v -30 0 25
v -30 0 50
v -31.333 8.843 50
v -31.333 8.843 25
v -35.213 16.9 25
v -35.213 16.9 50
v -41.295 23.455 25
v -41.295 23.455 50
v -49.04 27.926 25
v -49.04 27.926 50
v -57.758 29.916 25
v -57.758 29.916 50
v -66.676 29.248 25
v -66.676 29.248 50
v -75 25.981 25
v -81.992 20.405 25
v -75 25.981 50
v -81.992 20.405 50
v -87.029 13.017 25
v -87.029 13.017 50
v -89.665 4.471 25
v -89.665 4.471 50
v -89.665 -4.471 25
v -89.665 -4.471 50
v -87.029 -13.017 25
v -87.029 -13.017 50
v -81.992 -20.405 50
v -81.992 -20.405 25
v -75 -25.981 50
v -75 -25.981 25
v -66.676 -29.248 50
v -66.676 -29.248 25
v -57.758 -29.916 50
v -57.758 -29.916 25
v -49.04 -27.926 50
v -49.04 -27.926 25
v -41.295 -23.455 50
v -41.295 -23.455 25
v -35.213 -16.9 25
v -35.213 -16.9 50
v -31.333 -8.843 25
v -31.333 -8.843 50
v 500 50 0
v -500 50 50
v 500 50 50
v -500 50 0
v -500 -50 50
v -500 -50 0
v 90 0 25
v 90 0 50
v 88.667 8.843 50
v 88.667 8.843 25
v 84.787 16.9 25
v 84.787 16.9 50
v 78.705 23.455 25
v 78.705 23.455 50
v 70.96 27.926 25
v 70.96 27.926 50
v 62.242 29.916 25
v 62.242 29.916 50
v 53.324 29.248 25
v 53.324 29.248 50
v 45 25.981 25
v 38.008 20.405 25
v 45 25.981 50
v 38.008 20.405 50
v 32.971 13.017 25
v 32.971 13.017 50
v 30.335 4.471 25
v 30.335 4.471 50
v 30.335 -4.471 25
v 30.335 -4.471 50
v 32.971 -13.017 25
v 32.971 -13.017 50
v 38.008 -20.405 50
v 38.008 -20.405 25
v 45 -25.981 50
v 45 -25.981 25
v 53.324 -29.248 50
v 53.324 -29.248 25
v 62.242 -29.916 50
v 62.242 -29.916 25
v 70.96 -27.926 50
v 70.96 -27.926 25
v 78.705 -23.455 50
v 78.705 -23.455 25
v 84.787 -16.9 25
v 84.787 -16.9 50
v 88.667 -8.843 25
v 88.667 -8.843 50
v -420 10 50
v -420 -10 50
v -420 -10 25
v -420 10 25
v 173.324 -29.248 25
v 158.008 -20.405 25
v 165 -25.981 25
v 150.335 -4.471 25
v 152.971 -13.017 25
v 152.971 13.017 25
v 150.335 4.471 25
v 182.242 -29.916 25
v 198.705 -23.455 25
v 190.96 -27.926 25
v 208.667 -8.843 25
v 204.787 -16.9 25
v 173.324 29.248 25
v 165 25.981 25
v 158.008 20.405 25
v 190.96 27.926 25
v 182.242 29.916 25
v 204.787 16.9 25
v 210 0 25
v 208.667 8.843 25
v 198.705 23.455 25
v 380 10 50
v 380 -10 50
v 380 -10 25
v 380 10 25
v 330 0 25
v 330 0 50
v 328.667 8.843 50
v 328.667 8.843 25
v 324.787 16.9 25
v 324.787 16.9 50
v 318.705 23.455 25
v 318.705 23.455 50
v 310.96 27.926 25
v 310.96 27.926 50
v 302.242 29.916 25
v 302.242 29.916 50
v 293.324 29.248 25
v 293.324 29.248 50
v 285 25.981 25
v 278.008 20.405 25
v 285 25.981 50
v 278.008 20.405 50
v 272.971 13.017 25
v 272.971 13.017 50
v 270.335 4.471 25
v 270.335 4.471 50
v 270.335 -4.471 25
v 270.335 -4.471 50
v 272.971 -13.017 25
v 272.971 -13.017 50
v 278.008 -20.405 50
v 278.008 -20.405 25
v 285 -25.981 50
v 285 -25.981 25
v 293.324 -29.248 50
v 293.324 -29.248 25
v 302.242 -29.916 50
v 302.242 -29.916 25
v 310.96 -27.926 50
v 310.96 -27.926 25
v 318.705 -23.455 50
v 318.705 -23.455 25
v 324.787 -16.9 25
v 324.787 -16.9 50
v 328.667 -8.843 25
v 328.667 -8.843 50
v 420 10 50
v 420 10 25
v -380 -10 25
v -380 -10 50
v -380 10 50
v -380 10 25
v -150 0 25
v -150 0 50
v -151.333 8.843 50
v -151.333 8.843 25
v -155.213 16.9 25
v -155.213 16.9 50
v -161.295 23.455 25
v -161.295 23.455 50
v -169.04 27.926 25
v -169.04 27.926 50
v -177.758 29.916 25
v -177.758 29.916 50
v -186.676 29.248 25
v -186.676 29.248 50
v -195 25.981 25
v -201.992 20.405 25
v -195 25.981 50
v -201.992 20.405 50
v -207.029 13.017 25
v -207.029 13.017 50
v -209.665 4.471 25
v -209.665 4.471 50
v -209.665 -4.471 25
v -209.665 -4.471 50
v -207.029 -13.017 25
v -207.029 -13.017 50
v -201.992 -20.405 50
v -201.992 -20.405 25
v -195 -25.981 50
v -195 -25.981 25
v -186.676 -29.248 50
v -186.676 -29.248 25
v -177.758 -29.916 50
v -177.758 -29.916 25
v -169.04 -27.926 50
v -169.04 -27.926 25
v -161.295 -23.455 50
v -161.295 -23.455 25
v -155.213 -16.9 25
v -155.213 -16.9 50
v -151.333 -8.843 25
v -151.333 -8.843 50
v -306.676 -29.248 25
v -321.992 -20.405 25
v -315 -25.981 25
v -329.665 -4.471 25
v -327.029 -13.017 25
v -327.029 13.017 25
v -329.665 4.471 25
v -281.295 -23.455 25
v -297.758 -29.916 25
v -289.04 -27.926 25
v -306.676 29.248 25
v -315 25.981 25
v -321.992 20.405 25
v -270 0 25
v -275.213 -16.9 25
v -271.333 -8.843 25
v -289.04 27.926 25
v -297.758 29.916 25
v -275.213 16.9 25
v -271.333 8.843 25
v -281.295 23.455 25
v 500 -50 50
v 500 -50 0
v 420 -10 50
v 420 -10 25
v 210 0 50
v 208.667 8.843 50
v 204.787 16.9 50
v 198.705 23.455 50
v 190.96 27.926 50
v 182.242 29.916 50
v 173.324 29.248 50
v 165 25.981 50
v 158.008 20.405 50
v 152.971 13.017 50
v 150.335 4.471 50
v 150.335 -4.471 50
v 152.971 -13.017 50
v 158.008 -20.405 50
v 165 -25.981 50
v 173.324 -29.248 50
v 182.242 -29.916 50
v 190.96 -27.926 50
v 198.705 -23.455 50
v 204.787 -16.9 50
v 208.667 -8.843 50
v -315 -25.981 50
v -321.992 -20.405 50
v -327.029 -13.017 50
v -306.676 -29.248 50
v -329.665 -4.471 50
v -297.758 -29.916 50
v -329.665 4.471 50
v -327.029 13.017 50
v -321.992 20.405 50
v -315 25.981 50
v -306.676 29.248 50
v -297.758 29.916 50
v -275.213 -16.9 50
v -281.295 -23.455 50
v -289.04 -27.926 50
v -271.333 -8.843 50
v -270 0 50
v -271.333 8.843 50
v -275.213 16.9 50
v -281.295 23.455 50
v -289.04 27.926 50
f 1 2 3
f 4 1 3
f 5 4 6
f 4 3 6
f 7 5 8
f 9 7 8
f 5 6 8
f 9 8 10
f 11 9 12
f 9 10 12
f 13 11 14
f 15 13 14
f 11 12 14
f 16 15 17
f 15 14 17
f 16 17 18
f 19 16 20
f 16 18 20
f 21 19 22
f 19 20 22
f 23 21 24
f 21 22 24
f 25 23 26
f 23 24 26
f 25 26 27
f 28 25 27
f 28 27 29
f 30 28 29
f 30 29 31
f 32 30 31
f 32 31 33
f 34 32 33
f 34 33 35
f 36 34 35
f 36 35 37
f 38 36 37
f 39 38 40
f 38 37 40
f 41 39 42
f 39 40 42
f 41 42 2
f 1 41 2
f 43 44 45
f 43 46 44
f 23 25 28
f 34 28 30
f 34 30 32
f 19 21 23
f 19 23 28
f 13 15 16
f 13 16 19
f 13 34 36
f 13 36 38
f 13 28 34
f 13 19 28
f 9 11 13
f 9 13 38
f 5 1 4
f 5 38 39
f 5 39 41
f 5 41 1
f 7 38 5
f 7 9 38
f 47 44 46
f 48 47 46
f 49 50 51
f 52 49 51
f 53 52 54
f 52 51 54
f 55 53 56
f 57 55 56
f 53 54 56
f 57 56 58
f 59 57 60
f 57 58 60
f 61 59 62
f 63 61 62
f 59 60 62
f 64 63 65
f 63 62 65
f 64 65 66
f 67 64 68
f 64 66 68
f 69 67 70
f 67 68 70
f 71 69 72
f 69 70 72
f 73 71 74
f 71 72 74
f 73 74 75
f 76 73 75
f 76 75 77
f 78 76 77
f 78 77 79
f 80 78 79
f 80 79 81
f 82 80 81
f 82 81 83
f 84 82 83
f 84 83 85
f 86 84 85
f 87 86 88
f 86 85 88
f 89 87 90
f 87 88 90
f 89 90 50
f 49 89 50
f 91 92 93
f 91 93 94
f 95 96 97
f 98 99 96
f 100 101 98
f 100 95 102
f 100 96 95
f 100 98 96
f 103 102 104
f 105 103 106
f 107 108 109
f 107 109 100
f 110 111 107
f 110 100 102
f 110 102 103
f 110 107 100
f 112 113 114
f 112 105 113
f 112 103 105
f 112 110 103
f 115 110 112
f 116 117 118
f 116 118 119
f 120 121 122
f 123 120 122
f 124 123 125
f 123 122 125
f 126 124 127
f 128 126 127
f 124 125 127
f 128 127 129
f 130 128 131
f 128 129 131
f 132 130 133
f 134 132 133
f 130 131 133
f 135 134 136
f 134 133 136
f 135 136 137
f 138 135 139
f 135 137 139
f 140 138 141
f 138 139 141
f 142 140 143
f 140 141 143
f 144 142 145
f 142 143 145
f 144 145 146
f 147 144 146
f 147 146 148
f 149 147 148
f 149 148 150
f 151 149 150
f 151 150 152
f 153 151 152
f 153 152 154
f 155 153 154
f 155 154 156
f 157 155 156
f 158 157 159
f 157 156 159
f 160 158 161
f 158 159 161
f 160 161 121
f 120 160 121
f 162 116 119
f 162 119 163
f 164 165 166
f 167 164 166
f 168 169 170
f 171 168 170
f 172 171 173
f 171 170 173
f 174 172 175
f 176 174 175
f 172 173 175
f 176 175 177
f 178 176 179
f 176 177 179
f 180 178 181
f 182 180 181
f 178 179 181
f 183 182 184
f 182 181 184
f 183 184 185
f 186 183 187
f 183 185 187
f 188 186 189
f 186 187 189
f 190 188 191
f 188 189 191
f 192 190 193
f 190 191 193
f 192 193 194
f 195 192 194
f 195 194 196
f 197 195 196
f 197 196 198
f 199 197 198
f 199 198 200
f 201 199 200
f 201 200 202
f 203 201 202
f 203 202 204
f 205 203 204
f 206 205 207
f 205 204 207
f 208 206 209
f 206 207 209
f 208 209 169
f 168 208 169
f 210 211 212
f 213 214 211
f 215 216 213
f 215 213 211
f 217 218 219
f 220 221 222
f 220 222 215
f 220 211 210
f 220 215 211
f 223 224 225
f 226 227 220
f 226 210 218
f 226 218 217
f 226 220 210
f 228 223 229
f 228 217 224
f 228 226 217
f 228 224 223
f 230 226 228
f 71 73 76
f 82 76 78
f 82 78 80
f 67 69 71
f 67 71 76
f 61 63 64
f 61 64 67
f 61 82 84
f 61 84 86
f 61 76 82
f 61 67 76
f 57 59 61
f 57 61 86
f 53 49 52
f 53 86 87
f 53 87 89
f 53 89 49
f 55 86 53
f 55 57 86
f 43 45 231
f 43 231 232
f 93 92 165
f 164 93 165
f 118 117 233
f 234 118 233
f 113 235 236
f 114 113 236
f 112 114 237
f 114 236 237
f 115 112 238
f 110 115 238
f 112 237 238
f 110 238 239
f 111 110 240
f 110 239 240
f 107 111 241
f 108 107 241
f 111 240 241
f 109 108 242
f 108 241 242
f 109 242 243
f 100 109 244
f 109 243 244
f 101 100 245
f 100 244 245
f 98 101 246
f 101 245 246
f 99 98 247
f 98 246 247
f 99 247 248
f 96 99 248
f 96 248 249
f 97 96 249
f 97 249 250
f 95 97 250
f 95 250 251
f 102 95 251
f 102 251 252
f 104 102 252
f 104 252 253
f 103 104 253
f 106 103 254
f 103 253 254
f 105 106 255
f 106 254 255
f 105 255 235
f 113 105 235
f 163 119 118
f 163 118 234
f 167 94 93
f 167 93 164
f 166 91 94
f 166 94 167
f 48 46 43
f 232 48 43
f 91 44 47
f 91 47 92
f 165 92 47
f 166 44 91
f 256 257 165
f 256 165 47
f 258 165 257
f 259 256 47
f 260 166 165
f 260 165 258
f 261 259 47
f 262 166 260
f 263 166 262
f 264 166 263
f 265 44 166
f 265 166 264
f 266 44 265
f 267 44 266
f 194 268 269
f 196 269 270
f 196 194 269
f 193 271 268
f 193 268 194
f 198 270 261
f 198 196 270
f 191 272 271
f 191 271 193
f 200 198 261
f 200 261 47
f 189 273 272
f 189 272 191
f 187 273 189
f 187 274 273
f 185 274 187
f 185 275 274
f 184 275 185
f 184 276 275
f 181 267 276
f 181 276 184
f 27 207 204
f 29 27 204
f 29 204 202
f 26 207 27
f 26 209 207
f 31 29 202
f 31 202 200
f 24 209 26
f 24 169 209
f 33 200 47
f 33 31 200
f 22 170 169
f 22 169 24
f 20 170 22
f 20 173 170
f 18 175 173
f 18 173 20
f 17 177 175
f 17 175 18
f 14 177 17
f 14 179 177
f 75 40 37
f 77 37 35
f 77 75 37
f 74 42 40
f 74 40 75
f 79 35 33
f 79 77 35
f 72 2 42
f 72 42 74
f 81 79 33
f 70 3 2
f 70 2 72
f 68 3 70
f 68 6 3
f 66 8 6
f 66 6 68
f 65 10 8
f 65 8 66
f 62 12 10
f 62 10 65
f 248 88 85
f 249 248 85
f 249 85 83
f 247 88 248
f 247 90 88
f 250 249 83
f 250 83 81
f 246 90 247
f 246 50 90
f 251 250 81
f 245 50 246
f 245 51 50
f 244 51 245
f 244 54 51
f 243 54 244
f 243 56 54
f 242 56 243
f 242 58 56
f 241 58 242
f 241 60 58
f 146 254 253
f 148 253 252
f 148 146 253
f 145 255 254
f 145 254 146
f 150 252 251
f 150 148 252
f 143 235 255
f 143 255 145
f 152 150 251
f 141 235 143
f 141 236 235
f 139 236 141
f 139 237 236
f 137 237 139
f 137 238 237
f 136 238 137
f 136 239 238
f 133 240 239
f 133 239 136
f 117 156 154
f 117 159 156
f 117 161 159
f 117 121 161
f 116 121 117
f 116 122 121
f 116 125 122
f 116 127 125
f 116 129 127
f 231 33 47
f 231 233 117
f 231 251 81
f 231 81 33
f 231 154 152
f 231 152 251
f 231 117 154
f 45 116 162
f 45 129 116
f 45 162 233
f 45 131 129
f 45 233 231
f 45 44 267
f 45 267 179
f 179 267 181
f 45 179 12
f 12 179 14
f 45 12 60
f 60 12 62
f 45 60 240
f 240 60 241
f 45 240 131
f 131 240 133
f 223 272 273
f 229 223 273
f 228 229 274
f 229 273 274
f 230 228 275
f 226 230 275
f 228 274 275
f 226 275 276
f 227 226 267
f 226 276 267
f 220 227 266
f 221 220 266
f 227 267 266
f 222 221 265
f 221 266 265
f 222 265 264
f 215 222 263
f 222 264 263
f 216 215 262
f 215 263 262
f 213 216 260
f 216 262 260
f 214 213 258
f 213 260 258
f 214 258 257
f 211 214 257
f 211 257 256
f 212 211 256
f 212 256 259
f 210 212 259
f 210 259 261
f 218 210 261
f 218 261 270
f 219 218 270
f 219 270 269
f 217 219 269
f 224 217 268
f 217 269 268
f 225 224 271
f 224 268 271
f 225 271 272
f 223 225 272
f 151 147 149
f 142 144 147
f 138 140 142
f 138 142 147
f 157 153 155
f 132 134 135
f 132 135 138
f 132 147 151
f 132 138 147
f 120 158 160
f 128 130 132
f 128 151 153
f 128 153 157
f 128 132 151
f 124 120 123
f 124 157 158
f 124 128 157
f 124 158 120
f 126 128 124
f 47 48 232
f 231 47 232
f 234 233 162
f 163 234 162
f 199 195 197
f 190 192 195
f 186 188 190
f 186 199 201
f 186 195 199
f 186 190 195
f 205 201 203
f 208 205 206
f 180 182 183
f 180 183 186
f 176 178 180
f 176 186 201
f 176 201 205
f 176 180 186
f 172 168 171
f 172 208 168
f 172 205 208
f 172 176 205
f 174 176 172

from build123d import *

# Parameters (mm, degrees)
SKETCH1_W           = 900
SKETCH1_H           = 100
BOSS_EXTRUDE1_DEPTH = 50
SKETCH2_R           = 30
SKETCH2_W           = 40
SKETCH2_H           = 20
CUT_EXTRUDE1_DEPTH  = 25
SKETCH3_W           = 50
SKETCH3_H           = 50
BOSS_EXTRUDE3_DEPTH = 100


with BuildPart() as part:
    # Sketch1 → Boss-Extrude1 (new body)
    with BuildSketch(Plane.XY):
        Rectangle(SKETCH1_W, SKETCH1_H)
    extrude(amount=BOSS_EXTRUDE1_DEPTH)

    # Sketch2 → Cut-Extrude1 (cut)
    with BuildSketch(Plane.XY.offset(50)):
        with Locations((-300, 0)):
            Circle(SKETCH2_R)
        with Locations((-180, 0)):
            Circle(SKETCH2_R)
        with Locations((-60, 0)):
            Circle(SKETCH2_R)
        with Locations((60, 0)):
            Circle(SKETCH2_R)
        with Locations((180, 0)):
            Circle(SKETCH2_R)
        with Locations((300, 0)):
            Circle(SKETCH2_R)
        with Locations((400, 0)):
            Rectangle(SKETCH2_W, SKETCH2_H)
        with Locations((-400, 0)):
            Rectangle(SKETCH2_W, SKETCH2_H)
    extrude(amount=-CUT_EXTRUDE1_DEPTH, mode=Mode.SUBTRACT)

    # Sketch3 → Boss-Extrude3 (add)
    with BuildSketch(Plane(origin=(0, 50, 0), x_dir=(1, 0, 0), z_dir=(0, 1, 0))):
        with Locations((475, -25)):
            Rectangle(SKETCH3_W, SKETCH3_H)
        with Locations((-475, -25)):
            Rectangle(SKETCH3_W, SKETCH3_H)
    extrude(amount=-BOSS_EXTRUDE3_DEPTH)


solid = part.part
